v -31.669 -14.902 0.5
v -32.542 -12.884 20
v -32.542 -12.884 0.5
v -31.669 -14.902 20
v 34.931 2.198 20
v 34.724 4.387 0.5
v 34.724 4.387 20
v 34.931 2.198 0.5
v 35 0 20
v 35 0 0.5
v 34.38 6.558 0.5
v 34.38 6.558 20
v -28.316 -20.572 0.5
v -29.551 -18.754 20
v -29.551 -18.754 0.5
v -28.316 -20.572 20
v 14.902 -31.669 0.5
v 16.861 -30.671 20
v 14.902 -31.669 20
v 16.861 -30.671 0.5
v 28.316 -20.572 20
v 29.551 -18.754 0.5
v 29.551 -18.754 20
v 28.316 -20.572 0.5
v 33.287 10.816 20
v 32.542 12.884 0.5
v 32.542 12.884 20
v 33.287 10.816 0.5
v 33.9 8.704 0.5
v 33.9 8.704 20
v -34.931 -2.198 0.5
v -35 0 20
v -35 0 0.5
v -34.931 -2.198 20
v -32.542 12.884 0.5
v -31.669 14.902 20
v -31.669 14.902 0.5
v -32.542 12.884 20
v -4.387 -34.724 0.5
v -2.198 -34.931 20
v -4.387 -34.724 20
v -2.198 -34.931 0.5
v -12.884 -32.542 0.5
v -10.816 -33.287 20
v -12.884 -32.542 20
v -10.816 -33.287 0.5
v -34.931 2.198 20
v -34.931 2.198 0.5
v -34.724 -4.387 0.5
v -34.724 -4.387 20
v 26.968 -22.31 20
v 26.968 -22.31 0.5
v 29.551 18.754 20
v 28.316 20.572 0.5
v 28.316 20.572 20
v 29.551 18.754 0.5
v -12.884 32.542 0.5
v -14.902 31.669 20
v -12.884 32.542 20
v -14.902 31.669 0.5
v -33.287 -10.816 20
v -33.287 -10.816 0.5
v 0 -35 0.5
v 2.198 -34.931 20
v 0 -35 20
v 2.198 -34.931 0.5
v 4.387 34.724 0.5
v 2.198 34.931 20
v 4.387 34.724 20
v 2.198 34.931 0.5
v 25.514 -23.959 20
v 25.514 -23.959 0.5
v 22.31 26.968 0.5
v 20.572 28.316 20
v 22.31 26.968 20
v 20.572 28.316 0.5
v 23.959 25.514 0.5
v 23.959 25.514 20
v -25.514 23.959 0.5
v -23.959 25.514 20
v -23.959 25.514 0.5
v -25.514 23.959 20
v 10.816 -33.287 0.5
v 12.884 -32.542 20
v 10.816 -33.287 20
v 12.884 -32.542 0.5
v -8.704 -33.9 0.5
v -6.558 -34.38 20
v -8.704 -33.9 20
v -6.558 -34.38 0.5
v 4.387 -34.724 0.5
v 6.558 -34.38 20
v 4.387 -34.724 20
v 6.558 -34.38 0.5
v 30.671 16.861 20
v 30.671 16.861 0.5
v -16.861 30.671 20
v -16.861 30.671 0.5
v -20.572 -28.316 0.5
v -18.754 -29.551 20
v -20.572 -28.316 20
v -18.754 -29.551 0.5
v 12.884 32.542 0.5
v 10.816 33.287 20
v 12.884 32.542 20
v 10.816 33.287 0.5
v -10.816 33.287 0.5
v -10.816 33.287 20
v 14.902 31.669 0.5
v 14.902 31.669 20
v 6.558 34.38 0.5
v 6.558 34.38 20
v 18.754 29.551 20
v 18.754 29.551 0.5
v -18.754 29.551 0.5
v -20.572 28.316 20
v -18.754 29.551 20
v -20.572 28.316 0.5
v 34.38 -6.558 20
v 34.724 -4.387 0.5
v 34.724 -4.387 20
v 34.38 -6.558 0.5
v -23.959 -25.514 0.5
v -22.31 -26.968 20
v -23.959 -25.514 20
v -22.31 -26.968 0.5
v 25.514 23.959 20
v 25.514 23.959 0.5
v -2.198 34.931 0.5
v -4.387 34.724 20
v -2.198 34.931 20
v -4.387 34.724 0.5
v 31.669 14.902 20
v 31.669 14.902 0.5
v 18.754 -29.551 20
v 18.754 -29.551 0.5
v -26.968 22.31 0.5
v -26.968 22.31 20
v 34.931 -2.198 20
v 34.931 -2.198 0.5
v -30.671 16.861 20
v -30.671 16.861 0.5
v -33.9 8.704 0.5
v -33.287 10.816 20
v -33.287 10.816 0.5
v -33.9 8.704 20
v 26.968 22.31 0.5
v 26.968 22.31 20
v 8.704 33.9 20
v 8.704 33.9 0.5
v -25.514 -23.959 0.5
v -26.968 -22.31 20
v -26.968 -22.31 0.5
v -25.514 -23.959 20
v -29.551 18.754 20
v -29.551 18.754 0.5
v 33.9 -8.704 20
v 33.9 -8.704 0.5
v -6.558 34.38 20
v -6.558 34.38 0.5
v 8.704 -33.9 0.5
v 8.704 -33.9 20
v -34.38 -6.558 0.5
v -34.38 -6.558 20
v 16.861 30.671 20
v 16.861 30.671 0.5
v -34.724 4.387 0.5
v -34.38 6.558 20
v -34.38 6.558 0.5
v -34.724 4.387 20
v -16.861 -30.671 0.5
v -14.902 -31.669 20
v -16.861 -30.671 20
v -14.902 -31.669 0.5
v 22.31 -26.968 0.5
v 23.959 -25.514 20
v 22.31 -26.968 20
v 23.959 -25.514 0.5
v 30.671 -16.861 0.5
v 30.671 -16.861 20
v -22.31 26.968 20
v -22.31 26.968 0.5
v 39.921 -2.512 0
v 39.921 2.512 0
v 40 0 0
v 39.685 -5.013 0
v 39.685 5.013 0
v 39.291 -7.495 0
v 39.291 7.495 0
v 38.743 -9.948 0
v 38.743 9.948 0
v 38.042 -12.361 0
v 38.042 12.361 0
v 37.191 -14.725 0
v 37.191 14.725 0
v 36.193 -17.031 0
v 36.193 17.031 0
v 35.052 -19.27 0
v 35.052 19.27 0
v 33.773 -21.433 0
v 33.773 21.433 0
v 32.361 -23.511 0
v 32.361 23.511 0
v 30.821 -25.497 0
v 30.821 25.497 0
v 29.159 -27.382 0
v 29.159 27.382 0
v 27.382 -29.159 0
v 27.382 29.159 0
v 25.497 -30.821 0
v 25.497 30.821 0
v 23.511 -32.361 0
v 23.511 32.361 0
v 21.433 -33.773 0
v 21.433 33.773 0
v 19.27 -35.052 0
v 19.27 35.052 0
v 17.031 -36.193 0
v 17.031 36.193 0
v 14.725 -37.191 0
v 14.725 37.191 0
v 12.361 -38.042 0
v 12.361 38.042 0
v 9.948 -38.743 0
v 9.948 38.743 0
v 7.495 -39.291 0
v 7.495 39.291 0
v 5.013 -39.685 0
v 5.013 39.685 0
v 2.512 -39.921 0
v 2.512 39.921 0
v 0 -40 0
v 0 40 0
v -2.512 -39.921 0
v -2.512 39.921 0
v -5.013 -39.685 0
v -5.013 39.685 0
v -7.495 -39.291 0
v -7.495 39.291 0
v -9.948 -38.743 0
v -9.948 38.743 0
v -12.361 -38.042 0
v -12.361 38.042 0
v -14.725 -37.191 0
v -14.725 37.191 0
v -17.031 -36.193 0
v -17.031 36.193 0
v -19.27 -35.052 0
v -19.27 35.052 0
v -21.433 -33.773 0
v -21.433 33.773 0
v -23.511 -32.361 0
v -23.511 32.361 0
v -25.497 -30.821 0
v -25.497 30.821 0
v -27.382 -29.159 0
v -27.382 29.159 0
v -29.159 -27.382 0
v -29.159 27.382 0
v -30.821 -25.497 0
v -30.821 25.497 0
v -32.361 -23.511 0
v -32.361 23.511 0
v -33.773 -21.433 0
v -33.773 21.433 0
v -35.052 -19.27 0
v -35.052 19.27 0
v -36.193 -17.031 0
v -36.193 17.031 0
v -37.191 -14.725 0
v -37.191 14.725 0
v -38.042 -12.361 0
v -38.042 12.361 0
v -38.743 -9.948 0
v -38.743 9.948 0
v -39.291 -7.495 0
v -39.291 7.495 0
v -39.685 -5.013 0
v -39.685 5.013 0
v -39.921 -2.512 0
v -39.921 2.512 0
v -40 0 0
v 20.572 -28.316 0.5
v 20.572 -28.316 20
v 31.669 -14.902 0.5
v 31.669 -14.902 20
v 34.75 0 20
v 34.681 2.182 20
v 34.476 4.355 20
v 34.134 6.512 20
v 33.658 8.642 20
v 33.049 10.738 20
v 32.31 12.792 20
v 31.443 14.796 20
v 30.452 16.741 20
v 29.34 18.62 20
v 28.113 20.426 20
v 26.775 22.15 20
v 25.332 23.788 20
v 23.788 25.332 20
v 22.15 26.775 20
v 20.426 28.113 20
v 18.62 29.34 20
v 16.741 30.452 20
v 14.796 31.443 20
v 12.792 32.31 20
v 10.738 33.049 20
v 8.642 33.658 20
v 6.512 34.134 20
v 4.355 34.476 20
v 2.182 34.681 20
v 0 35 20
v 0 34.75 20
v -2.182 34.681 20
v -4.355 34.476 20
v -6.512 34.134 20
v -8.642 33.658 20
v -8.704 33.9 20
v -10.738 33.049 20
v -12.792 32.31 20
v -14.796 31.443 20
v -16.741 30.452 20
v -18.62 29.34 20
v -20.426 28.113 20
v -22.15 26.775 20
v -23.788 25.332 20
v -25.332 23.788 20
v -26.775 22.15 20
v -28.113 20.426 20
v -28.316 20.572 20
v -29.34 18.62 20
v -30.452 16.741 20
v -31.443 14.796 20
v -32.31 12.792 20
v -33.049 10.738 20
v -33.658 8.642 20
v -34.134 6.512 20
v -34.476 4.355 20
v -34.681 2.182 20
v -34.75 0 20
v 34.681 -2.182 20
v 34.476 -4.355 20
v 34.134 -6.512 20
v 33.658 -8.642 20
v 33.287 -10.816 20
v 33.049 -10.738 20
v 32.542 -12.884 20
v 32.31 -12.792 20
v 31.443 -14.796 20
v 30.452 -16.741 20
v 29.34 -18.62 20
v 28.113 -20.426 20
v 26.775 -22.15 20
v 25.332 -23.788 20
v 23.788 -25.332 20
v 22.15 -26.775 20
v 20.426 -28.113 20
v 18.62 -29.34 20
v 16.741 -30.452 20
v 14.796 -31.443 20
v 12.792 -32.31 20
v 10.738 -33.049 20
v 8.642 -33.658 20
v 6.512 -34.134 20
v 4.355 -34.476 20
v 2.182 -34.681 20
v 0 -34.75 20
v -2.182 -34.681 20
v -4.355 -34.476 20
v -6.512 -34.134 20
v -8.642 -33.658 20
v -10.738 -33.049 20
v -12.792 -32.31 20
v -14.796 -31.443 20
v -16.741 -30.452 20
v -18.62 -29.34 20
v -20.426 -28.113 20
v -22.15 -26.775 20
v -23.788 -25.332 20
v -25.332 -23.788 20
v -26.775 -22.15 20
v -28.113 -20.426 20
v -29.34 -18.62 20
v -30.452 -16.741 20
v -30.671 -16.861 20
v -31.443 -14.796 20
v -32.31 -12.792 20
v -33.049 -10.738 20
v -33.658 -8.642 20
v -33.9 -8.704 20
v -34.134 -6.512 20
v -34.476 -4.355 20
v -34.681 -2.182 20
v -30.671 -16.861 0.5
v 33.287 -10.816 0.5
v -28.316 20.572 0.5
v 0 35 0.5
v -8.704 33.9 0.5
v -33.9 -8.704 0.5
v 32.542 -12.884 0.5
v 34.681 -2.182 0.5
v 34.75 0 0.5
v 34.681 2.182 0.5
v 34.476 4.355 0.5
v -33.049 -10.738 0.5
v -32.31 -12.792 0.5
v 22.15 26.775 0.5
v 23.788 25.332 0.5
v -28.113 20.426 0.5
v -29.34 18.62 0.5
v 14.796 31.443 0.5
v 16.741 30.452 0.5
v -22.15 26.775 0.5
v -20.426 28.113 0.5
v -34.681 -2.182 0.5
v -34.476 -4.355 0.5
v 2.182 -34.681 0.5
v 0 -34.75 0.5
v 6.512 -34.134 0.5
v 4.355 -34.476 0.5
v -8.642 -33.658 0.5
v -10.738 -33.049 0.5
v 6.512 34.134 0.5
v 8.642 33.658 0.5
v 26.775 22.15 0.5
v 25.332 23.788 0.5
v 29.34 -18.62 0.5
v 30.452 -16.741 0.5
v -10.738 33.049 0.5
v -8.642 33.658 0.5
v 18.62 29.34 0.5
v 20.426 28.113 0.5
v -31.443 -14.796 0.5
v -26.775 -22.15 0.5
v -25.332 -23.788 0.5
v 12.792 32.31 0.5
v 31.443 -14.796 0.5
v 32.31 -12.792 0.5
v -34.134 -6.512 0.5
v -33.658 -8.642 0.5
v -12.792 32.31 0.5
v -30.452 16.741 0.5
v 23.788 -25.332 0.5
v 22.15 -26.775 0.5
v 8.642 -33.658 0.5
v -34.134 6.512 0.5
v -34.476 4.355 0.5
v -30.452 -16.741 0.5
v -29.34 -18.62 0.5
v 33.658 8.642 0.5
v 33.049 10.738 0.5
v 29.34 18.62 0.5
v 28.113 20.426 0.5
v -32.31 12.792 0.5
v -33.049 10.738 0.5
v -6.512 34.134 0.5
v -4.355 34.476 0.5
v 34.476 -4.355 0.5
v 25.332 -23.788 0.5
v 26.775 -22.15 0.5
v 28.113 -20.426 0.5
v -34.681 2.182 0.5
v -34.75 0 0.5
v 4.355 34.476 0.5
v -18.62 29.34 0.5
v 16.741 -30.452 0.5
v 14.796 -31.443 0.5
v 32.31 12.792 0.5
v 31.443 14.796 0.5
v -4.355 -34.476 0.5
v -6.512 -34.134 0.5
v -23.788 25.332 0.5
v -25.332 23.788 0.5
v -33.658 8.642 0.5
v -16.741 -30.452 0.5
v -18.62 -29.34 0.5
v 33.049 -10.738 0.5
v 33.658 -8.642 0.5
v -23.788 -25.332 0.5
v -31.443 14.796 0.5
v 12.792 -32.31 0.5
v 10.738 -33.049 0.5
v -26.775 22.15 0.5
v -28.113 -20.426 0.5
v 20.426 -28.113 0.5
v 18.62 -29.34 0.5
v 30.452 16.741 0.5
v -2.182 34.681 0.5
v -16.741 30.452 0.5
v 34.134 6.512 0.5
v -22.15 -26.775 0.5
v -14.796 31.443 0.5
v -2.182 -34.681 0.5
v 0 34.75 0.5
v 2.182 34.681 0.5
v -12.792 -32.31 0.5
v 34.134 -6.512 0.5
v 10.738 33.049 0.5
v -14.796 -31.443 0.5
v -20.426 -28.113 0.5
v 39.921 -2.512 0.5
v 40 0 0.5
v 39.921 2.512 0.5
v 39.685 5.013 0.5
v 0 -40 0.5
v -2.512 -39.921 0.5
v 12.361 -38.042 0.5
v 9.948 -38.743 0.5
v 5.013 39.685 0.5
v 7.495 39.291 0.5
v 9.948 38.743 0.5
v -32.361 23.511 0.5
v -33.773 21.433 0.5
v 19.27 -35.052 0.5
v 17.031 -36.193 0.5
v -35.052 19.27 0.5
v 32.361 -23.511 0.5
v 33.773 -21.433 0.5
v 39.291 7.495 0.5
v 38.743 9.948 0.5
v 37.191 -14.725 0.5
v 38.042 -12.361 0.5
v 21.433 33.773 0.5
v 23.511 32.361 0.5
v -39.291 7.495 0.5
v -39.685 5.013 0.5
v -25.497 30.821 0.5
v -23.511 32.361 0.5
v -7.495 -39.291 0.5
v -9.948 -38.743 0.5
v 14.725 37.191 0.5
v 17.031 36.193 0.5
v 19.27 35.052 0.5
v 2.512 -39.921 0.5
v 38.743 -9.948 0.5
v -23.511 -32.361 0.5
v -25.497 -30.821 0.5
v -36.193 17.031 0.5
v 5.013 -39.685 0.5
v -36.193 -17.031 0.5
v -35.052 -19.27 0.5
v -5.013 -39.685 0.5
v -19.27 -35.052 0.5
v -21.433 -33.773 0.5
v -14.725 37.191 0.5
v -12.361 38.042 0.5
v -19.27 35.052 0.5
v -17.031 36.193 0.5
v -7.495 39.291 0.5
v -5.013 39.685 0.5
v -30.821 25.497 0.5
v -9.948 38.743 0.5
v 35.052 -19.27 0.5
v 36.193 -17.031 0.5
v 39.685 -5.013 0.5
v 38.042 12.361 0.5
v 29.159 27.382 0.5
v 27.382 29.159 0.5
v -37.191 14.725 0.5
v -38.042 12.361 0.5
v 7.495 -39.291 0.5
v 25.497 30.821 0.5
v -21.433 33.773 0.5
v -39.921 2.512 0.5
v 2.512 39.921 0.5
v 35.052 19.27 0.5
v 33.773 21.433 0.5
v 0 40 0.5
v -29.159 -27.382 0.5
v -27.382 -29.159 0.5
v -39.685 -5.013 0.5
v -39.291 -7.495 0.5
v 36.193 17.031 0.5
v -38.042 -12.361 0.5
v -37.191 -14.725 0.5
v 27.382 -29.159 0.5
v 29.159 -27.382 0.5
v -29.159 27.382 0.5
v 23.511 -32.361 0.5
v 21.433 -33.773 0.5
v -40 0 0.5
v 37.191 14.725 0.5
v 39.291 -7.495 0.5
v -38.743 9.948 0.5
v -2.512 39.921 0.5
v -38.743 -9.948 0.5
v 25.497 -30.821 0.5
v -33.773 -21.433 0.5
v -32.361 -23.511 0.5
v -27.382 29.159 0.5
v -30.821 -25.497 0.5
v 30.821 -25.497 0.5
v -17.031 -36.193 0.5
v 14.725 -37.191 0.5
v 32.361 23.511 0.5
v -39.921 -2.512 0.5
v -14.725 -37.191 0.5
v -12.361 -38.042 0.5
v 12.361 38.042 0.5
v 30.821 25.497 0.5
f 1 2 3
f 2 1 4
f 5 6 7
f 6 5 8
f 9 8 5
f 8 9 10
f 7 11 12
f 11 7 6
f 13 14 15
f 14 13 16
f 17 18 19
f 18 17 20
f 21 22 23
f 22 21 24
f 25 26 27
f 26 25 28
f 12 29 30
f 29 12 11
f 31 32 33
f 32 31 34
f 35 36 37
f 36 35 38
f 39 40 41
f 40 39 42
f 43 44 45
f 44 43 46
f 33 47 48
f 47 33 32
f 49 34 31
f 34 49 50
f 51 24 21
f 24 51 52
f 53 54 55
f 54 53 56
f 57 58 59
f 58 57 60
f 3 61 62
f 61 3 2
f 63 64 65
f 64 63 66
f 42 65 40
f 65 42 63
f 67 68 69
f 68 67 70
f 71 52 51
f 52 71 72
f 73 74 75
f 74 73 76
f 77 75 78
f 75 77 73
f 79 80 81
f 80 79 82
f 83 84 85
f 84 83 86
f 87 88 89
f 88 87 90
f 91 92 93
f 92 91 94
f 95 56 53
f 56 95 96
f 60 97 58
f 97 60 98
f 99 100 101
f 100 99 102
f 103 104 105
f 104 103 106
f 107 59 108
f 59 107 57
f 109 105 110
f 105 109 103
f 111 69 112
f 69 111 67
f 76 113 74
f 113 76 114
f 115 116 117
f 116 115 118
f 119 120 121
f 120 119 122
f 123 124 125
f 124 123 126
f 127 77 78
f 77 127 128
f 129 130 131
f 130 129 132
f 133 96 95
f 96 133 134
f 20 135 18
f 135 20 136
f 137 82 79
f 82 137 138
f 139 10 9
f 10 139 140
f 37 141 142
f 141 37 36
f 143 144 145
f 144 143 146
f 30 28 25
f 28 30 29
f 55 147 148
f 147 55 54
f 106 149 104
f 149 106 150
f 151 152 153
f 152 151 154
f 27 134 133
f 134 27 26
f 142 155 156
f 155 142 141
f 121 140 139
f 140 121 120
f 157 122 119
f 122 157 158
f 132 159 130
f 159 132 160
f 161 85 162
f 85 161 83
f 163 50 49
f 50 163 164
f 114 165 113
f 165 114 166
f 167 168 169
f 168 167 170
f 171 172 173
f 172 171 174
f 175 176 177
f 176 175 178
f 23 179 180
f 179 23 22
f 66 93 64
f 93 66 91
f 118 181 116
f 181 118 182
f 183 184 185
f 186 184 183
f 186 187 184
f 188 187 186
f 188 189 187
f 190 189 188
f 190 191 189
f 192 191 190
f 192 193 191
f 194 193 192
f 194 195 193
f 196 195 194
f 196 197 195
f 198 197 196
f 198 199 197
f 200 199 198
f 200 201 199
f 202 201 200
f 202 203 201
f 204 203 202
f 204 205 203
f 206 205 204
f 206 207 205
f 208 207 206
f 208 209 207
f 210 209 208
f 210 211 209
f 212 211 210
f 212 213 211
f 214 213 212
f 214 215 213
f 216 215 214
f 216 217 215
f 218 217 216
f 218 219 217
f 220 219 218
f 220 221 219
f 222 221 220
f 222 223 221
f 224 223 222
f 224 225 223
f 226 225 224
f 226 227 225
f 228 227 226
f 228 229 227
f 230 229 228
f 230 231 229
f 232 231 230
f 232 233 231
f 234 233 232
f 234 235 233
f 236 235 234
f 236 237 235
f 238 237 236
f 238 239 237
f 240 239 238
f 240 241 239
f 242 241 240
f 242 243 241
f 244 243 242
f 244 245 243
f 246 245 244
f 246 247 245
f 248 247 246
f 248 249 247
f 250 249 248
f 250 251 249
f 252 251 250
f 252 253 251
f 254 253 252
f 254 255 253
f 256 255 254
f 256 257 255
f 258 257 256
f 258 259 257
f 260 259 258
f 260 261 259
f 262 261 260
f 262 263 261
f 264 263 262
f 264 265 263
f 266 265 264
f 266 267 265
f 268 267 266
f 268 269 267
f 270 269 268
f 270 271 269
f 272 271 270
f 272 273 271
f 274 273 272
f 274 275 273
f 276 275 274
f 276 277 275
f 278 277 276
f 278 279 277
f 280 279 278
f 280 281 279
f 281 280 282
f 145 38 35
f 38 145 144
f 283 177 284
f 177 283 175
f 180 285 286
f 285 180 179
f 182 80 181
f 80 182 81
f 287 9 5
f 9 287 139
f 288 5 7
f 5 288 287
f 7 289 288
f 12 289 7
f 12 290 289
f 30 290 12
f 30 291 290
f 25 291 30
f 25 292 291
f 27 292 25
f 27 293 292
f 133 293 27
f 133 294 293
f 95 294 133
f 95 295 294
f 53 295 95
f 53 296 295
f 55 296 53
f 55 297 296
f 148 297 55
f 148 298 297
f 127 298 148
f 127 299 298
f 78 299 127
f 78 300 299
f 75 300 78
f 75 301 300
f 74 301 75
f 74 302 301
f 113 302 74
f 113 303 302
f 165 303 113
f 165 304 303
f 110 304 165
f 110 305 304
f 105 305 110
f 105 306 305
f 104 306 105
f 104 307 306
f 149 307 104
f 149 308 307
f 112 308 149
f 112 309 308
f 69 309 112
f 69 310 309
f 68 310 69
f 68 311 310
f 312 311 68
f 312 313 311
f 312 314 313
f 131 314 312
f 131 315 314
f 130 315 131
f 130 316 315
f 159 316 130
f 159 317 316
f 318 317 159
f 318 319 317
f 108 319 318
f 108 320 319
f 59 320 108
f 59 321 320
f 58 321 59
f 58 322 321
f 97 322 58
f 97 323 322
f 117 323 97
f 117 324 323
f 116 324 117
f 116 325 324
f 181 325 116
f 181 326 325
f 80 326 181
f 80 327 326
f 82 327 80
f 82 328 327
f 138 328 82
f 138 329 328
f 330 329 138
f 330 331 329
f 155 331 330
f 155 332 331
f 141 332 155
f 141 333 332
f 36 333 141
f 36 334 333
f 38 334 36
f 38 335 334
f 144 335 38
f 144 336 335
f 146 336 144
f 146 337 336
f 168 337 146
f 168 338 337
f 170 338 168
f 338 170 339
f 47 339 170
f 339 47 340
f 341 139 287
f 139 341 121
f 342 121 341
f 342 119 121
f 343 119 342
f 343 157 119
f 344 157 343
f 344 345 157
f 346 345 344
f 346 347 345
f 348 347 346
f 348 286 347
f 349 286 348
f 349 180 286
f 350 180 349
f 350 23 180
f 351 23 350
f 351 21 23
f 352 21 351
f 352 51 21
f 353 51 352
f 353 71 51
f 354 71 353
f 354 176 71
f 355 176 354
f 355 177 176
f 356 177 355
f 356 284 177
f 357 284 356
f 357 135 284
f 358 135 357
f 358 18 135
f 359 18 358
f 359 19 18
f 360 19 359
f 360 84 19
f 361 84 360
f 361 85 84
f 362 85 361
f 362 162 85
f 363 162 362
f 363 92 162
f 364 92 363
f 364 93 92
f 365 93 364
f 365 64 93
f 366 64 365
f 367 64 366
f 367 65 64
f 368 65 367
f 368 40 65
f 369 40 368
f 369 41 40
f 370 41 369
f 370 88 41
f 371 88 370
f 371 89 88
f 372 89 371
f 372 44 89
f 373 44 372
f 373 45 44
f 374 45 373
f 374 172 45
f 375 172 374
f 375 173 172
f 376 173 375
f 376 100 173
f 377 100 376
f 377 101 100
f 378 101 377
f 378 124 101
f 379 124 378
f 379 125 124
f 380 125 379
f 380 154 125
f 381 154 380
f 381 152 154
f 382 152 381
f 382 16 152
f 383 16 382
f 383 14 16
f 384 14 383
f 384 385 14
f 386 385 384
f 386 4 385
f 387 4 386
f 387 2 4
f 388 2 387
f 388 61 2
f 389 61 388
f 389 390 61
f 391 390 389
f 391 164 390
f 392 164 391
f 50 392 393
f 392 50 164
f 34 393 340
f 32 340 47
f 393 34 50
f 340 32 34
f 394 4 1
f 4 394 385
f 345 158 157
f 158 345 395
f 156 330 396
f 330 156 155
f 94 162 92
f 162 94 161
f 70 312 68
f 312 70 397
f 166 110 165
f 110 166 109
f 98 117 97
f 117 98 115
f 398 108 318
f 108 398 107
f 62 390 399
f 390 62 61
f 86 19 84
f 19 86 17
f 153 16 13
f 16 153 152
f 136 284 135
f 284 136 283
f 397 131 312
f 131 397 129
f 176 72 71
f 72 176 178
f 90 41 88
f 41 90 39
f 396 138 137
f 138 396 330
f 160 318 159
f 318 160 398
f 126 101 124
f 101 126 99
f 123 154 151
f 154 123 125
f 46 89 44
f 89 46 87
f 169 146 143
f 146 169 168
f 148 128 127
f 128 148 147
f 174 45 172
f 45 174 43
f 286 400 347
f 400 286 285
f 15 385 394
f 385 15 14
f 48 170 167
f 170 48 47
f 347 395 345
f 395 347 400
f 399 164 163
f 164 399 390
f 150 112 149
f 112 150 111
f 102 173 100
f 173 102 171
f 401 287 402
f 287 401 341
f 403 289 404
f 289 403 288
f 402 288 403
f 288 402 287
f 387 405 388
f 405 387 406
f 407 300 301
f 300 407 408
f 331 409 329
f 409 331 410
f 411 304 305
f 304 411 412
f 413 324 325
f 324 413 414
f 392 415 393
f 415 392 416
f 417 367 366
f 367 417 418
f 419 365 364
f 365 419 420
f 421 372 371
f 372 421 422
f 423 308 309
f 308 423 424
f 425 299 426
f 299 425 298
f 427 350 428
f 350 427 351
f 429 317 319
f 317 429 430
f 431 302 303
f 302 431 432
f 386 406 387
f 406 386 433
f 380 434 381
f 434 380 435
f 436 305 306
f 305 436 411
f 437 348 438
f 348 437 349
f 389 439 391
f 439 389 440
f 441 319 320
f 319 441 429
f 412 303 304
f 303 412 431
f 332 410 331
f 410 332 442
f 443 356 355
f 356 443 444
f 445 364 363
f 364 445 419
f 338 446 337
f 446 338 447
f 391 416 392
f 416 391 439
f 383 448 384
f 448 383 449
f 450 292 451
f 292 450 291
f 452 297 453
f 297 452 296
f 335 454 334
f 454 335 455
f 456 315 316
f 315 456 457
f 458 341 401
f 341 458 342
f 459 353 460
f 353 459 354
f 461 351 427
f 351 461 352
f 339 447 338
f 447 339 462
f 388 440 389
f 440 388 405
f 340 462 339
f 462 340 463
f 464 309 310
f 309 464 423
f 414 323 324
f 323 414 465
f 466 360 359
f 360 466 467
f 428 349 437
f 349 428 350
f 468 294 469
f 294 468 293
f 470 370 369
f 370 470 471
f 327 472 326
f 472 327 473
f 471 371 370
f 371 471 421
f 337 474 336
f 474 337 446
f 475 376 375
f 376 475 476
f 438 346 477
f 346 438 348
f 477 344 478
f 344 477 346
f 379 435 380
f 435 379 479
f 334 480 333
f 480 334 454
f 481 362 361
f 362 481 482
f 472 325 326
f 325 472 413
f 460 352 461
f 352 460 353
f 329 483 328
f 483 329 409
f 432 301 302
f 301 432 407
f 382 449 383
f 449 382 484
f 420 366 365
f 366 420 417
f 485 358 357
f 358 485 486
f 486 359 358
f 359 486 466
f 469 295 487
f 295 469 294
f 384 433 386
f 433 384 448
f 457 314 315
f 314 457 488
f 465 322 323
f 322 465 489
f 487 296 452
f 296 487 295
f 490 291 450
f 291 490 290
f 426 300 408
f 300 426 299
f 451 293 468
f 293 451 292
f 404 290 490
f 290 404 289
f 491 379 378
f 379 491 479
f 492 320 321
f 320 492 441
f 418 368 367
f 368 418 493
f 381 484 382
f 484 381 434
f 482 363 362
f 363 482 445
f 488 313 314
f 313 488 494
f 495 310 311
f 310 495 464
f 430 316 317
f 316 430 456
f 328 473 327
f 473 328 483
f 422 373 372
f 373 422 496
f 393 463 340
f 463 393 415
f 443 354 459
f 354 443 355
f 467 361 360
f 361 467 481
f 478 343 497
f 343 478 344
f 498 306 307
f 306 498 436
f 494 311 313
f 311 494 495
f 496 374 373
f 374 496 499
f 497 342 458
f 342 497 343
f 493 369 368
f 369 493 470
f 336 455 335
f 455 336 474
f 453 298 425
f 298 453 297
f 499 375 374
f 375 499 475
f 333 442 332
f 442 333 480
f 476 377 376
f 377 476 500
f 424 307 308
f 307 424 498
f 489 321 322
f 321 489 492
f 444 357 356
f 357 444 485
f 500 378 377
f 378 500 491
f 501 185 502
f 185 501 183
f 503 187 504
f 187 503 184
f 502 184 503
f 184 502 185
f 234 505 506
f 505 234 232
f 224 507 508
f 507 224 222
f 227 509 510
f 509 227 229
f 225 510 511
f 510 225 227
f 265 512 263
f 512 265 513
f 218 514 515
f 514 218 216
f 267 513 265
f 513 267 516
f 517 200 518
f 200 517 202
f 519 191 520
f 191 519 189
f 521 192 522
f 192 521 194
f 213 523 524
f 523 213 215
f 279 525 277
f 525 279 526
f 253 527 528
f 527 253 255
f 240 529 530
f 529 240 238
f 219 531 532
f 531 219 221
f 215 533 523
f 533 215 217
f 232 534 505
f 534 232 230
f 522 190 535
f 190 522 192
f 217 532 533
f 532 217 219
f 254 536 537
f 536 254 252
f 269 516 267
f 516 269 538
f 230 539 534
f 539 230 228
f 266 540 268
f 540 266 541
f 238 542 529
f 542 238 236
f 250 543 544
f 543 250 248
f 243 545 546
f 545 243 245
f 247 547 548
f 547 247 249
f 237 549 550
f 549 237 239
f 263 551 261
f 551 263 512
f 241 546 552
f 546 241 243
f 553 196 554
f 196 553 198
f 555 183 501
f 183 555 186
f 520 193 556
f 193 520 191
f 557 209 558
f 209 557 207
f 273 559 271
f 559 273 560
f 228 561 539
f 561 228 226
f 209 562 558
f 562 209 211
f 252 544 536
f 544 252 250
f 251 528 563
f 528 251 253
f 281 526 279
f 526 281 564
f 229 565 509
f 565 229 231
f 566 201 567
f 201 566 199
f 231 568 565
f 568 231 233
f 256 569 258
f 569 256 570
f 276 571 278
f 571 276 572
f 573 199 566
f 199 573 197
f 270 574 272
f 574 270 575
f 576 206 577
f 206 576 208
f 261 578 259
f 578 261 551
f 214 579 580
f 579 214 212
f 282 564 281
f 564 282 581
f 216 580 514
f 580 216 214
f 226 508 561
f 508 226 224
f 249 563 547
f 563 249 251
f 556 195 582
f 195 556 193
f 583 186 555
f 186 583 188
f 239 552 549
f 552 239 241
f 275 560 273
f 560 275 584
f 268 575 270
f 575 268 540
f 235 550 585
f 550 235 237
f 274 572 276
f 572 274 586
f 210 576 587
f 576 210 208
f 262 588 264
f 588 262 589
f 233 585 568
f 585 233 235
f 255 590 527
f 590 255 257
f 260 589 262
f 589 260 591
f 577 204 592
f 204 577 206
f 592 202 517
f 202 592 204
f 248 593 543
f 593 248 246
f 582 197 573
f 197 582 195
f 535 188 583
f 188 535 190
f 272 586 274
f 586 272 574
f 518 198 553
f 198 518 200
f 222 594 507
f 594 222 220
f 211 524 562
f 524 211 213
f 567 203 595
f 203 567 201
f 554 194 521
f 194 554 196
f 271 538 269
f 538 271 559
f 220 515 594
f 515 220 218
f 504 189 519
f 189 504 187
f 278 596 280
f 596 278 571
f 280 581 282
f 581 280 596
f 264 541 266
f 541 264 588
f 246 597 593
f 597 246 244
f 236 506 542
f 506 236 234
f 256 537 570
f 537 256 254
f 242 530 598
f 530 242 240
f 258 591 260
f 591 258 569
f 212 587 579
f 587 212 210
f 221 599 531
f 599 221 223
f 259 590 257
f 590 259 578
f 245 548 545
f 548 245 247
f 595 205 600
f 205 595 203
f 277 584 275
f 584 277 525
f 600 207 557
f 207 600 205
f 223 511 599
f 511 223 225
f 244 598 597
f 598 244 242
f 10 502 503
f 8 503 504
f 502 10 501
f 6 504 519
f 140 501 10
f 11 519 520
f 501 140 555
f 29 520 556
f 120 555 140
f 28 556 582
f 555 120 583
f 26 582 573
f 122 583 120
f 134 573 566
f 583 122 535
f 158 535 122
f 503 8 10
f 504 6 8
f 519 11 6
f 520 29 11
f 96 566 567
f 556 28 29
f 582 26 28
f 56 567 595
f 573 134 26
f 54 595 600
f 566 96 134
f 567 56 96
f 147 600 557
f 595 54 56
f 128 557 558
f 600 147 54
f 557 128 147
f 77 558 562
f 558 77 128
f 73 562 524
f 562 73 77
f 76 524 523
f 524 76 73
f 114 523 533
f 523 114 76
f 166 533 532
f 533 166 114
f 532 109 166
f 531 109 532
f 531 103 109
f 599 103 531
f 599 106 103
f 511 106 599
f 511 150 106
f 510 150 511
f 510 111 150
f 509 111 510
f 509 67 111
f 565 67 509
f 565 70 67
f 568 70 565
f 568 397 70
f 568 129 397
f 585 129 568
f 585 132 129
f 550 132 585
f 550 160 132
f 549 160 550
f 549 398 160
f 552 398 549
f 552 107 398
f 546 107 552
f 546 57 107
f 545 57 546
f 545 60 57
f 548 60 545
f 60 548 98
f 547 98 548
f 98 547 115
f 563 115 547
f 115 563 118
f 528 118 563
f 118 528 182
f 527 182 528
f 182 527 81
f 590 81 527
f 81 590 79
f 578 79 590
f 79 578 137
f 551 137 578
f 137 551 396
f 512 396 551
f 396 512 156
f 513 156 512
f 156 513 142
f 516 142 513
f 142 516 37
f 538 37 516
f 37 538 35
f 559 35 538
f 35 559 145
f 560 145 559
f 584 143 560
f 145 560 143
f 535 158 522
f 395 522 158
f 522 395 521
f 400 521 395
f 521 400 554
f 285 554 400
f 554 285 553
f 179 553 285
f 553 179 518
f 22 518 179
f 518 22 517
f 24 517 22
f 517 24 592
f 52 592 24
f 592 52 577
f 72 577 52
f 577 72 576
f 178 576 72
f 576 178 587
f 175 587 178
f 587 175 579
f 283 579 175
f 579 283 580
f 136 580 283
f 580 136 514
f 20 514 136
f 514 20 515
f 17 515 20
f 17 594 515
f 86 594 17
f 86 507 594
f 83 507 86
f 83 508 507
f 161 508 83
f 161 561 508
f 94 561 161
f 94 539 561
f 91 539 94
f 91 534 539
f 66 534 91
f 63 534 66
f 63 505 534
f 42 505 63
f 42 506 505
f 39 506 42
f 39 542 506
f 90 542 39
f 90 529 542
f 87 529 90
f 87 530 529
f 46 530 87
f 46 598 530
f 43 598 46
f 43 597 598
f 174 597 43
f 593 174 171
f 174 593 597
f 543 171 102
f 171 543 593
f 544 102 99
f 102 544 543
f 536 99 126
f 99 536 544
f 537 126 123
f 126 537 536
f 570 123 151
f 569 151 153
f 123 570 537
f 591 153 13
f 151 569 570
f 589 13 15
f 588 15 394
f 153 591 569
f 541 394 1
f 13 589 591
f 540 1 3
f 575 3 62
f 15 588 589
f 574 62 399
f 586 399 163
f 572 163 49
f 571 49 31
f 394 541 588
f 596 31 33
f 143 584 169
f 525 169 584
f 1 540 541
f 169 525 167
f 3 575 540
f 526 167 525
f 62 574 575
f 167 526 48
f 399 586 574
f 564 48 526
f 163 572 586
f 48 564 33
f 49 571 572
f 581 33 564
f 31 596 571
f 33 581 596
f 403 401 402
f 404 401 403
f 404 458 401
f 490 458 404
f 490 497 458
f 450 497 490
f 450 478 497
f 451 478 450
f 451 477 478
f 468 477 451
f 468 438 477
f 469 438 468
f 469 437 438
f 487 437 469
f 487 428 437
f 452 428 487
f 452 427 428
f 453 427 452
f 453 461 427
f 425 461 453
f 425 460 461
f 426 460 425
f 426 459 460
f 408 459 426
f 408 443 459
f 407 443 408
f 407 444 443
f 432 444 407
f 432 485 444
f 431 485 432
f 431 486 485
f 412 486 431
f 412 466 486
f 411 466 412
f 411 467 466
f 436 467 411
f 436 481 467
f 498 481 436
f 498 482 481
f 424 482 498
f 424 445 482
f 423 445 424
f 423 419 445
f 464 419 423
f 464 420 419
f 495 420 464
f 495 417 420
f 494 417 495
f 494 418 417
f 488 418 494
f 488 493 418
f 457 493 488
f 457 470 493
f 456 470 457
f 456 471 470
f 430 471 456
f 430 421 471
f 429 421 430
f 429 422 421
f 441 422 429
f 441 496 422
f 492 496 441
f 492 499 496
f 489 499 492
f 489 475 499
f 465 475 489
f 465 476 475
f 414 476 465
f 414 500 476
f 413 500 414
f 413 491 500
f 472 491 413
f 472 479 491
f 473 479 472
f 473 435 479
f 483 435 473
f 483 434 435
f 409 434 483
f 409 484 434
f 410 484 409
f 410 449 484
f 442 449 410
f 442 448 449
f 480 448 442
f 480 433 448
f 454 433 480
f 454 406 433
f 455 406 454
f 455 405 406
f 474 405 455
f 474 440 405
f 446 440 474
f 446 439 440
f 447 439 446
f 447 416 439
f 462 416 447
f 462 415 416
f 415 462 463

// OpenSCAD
$fn=100;

union() {
    cylinder(.5, r=40);
    difference() {
        cylinder(20, r=35);
        cylinder(30, r=34.75);
    }
}
